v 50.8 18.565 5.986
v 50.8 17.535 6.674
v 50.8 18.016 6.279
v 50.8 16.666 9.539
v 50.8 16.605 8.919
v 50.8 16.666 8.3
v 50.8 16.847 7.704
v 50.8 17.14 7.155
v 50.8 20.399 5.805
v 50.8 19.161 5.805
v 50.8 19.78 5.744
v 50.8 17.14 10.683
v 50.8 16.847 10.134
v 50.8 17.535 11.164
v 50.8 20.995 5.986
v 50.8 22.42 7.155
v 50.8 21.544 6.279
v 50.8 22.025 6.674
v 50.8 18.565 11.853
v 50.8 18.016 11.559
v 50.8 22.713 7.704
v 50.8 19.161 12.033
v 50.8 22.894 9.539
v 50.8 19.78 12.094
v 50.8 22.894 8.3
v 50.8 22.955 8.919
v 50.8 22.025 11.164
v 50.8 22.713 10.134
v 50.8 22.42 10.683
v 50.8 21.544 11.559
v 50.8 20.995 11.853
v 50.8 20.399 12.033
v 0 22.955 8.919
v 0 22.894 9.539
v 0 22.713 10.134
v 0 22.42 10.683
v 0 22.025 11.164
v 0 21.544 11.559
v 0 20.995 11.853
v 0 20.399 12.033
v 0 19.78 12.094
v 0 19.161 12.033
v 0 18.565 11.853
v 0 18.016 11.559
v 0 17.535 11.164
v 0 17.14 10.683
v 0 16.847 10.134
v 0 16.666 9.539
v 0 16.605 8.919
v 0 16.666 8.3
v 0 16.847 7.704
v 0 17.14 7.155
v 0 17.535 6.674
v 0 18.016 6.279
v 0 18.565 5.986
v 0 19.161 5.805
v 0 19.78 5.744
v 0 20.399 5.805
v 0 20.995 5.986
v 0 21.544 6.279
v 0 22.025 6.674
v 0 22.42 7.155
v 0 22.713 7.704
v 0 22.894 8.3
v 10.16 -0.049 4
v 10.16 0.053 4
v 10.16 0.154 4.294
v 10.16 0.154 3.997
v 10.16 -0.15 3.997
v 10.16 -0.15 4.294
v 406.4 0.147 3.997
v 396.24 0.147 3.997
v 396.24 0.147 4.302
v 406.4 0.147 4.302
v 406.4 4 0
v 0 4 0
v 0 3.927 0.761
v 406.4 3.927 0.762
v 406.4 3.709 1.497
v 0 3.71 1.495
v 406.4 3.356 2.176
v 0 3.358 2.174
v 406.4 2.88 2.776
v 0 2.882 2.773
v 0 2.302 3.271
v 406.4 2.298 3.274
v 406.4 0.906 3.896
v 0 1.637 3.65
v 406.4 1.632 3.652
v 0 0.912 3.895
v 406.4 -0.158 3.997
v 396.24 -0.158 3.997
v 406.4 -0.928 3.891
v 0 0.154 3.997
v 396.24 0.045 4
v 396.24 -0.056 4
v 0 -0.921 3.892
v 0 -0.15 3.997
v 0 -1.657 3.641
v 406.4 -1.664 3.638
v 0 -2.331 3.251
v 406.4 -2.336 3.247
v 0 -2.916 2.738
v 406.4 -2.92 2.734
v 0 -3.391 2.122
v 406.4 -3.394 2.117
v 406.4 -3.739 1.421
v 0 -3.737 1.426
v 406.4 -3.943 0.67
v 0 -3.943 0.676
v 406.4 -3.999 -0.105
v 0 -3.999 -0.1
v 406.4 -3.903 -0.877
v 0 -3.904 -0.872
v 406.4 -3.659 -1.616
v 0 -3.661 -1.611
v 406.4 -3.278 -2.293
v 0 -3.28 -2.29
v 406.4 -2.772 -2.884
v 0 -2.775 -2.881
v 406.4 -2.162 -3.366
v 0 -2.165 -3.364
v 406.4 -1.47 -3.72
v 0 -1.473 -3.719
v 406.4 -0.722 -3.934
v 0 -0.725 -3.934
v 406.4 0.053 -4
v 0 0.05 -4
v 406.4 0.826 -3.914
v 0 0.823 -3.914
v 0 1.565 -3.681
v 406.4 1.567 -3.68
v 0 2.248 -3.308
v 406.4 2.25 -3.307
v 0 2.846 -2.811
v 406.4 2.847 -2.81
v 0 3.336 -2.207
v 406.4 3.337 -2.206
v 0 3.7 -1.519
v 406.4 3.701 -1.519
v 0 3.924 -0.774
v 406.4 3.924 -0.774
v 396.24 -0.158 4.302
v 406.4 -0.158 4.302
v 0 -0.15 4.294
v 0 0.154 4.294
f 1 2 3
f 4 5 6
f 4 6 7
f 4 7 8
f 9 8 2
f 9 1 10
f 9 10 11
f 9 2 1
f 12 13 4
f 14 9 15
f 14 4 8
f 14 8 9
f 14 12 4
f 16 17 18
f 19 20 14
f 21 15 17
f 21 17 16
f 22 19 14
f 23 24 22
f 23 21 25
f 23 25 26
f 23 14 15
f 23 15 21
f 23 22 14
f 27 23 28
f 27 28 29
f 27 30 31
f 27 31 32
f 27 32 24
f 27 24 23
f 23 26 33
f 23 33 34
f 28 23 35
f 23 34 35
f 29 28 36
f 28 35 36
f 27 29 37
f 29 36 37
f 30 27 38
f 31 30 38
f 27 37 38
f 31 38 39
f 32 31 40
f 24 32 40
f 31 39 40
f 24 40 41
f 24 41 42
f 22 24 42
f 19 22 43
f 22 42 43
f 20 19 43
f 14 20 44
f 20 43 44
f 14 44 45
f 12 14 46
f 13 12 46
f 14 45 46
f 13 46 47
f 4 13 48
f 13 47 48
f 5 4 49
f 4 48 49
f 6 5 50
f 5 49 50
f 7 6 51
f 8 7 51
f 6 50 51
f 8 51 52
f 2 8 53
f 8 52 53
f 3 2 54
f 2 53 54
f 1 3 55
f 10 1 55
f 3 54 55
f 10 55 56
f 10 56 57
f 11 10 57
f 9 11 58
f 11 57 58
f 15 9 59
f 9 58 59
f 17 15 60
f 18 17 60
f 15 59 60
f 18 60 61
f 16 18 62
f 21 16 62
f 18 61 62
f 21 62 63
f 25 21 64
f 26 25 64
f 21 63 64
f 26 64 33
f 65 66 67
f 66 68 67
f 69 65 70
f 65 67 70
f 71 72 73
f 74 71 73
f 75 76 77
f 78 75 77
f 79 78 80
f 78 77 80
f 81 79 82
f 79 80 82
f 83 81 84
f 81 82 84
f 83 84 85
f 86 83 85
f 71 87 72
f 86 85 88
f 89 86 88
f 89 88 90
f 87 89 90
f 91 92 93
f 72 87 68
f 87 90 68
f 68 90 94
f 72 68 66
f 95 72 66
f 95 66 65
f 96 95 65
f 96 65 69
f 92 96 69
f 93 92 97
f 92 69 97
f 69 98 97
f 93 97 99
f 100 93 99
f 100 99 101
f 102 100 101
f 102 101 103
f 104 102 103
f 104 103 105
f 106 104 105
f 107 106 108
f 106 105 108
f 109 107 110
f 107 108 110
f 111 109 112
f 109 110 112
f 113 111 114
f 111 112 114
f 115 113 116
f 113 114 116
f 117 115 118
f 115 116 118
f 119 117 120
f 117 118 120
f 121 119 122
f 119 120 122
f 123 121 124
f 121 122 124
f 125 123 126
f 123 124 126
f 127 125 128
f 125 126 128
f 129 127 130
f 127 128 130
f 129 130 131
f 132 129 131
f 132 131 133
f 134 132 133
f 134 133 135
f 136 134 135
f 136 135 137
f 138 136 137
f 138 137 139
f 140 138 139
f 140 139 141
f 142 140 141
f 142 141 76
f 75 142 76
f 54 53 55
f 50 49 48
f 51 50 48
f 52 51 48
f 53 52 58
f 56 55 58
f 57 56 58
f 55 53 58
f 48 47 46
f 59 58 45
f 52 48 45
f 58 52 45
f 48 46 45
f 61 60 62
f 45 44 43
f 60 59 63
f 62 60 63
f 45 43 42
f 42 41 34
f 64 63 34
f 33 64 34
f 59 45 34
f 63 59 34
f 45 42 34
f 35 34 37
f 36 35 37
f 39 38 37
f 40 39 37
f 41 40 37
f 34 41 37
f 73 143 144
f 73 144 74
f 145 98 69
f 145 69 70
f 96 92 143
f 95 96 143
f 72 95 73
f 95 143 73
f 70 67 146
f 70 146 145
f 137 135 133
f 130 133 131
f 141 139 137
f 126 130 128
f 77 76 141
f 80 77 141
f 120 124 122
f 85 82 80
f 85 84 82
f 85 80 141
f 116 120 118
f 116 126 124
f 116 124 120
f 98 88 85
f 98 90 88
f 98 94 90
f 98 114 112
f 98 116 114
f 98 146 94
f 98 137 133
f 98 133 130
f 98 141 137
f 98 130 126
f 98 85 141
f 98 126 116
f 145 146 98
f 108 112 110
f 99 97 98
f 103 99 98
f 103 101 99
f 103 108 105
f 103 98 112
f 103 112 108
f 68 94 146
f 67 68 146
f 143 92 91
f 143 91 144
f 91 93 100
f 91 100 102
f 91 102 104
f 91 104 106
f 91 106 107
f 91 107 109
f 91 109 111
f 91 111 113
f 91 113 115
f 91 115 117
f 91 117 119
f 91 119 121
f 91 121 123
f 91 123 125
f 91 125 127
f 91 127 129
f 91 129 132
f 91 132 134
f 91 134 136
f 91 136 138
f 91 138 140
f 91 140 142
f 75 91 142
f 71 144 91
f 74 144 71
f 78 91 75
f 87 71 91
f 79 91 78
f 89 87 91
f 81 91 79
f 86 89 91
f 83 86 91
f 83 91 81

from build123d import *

# Parameters (mm, degrees)
F0_R      = 4
F1_DEPTH  = 406.4
F6_W      = 0.3048
F6_H      = 0.3048
F7_DEPTH  = 10.16
F8_W      = 0.3048
F8_H      = 0.296858
F9_DEPTH  = 10.16
F10_R     = 3.175
F11_DEPTH = 50.8


with BuildPart() as f1:
    # F0 (on Right) → F1 (new body)
    with BuildSketch(Plane.YZ):
        Circle(F0_R)
    extrude(amount=F1_DEPTH)

    # F6 (on face) → F7 (join)
    with BuildSketch(Plane.YZ.offset(406.4)):
        with Locations((-0.005654, 4.149276)):
            Rectangle(F6_W, F6_H)
    extrude(amount=-F7_DEPTH)

    # F8 (on face) → F9 (join)
    with BuildSketch(Plane(origin=(0, 0, 0), x_dir=(0, -1, 0), z_dir=(-1, 0, 0))):
        with Locations((-0.001954, 4.14545)):
            Rectangle(F8_W, F8_H)
    extrude(amount=-F9_DEPTH)


with BuildPart() as f11:
    # F10 (on Right) → F11 (new body)
    with BuildSketch(Plane.YZ):
        with Locations((19.780048, 8.919234)):
            Circle(F10_R)
    extrude(amount=F11_DEPTH)


solid = Compound([f1.part, f11.part])
